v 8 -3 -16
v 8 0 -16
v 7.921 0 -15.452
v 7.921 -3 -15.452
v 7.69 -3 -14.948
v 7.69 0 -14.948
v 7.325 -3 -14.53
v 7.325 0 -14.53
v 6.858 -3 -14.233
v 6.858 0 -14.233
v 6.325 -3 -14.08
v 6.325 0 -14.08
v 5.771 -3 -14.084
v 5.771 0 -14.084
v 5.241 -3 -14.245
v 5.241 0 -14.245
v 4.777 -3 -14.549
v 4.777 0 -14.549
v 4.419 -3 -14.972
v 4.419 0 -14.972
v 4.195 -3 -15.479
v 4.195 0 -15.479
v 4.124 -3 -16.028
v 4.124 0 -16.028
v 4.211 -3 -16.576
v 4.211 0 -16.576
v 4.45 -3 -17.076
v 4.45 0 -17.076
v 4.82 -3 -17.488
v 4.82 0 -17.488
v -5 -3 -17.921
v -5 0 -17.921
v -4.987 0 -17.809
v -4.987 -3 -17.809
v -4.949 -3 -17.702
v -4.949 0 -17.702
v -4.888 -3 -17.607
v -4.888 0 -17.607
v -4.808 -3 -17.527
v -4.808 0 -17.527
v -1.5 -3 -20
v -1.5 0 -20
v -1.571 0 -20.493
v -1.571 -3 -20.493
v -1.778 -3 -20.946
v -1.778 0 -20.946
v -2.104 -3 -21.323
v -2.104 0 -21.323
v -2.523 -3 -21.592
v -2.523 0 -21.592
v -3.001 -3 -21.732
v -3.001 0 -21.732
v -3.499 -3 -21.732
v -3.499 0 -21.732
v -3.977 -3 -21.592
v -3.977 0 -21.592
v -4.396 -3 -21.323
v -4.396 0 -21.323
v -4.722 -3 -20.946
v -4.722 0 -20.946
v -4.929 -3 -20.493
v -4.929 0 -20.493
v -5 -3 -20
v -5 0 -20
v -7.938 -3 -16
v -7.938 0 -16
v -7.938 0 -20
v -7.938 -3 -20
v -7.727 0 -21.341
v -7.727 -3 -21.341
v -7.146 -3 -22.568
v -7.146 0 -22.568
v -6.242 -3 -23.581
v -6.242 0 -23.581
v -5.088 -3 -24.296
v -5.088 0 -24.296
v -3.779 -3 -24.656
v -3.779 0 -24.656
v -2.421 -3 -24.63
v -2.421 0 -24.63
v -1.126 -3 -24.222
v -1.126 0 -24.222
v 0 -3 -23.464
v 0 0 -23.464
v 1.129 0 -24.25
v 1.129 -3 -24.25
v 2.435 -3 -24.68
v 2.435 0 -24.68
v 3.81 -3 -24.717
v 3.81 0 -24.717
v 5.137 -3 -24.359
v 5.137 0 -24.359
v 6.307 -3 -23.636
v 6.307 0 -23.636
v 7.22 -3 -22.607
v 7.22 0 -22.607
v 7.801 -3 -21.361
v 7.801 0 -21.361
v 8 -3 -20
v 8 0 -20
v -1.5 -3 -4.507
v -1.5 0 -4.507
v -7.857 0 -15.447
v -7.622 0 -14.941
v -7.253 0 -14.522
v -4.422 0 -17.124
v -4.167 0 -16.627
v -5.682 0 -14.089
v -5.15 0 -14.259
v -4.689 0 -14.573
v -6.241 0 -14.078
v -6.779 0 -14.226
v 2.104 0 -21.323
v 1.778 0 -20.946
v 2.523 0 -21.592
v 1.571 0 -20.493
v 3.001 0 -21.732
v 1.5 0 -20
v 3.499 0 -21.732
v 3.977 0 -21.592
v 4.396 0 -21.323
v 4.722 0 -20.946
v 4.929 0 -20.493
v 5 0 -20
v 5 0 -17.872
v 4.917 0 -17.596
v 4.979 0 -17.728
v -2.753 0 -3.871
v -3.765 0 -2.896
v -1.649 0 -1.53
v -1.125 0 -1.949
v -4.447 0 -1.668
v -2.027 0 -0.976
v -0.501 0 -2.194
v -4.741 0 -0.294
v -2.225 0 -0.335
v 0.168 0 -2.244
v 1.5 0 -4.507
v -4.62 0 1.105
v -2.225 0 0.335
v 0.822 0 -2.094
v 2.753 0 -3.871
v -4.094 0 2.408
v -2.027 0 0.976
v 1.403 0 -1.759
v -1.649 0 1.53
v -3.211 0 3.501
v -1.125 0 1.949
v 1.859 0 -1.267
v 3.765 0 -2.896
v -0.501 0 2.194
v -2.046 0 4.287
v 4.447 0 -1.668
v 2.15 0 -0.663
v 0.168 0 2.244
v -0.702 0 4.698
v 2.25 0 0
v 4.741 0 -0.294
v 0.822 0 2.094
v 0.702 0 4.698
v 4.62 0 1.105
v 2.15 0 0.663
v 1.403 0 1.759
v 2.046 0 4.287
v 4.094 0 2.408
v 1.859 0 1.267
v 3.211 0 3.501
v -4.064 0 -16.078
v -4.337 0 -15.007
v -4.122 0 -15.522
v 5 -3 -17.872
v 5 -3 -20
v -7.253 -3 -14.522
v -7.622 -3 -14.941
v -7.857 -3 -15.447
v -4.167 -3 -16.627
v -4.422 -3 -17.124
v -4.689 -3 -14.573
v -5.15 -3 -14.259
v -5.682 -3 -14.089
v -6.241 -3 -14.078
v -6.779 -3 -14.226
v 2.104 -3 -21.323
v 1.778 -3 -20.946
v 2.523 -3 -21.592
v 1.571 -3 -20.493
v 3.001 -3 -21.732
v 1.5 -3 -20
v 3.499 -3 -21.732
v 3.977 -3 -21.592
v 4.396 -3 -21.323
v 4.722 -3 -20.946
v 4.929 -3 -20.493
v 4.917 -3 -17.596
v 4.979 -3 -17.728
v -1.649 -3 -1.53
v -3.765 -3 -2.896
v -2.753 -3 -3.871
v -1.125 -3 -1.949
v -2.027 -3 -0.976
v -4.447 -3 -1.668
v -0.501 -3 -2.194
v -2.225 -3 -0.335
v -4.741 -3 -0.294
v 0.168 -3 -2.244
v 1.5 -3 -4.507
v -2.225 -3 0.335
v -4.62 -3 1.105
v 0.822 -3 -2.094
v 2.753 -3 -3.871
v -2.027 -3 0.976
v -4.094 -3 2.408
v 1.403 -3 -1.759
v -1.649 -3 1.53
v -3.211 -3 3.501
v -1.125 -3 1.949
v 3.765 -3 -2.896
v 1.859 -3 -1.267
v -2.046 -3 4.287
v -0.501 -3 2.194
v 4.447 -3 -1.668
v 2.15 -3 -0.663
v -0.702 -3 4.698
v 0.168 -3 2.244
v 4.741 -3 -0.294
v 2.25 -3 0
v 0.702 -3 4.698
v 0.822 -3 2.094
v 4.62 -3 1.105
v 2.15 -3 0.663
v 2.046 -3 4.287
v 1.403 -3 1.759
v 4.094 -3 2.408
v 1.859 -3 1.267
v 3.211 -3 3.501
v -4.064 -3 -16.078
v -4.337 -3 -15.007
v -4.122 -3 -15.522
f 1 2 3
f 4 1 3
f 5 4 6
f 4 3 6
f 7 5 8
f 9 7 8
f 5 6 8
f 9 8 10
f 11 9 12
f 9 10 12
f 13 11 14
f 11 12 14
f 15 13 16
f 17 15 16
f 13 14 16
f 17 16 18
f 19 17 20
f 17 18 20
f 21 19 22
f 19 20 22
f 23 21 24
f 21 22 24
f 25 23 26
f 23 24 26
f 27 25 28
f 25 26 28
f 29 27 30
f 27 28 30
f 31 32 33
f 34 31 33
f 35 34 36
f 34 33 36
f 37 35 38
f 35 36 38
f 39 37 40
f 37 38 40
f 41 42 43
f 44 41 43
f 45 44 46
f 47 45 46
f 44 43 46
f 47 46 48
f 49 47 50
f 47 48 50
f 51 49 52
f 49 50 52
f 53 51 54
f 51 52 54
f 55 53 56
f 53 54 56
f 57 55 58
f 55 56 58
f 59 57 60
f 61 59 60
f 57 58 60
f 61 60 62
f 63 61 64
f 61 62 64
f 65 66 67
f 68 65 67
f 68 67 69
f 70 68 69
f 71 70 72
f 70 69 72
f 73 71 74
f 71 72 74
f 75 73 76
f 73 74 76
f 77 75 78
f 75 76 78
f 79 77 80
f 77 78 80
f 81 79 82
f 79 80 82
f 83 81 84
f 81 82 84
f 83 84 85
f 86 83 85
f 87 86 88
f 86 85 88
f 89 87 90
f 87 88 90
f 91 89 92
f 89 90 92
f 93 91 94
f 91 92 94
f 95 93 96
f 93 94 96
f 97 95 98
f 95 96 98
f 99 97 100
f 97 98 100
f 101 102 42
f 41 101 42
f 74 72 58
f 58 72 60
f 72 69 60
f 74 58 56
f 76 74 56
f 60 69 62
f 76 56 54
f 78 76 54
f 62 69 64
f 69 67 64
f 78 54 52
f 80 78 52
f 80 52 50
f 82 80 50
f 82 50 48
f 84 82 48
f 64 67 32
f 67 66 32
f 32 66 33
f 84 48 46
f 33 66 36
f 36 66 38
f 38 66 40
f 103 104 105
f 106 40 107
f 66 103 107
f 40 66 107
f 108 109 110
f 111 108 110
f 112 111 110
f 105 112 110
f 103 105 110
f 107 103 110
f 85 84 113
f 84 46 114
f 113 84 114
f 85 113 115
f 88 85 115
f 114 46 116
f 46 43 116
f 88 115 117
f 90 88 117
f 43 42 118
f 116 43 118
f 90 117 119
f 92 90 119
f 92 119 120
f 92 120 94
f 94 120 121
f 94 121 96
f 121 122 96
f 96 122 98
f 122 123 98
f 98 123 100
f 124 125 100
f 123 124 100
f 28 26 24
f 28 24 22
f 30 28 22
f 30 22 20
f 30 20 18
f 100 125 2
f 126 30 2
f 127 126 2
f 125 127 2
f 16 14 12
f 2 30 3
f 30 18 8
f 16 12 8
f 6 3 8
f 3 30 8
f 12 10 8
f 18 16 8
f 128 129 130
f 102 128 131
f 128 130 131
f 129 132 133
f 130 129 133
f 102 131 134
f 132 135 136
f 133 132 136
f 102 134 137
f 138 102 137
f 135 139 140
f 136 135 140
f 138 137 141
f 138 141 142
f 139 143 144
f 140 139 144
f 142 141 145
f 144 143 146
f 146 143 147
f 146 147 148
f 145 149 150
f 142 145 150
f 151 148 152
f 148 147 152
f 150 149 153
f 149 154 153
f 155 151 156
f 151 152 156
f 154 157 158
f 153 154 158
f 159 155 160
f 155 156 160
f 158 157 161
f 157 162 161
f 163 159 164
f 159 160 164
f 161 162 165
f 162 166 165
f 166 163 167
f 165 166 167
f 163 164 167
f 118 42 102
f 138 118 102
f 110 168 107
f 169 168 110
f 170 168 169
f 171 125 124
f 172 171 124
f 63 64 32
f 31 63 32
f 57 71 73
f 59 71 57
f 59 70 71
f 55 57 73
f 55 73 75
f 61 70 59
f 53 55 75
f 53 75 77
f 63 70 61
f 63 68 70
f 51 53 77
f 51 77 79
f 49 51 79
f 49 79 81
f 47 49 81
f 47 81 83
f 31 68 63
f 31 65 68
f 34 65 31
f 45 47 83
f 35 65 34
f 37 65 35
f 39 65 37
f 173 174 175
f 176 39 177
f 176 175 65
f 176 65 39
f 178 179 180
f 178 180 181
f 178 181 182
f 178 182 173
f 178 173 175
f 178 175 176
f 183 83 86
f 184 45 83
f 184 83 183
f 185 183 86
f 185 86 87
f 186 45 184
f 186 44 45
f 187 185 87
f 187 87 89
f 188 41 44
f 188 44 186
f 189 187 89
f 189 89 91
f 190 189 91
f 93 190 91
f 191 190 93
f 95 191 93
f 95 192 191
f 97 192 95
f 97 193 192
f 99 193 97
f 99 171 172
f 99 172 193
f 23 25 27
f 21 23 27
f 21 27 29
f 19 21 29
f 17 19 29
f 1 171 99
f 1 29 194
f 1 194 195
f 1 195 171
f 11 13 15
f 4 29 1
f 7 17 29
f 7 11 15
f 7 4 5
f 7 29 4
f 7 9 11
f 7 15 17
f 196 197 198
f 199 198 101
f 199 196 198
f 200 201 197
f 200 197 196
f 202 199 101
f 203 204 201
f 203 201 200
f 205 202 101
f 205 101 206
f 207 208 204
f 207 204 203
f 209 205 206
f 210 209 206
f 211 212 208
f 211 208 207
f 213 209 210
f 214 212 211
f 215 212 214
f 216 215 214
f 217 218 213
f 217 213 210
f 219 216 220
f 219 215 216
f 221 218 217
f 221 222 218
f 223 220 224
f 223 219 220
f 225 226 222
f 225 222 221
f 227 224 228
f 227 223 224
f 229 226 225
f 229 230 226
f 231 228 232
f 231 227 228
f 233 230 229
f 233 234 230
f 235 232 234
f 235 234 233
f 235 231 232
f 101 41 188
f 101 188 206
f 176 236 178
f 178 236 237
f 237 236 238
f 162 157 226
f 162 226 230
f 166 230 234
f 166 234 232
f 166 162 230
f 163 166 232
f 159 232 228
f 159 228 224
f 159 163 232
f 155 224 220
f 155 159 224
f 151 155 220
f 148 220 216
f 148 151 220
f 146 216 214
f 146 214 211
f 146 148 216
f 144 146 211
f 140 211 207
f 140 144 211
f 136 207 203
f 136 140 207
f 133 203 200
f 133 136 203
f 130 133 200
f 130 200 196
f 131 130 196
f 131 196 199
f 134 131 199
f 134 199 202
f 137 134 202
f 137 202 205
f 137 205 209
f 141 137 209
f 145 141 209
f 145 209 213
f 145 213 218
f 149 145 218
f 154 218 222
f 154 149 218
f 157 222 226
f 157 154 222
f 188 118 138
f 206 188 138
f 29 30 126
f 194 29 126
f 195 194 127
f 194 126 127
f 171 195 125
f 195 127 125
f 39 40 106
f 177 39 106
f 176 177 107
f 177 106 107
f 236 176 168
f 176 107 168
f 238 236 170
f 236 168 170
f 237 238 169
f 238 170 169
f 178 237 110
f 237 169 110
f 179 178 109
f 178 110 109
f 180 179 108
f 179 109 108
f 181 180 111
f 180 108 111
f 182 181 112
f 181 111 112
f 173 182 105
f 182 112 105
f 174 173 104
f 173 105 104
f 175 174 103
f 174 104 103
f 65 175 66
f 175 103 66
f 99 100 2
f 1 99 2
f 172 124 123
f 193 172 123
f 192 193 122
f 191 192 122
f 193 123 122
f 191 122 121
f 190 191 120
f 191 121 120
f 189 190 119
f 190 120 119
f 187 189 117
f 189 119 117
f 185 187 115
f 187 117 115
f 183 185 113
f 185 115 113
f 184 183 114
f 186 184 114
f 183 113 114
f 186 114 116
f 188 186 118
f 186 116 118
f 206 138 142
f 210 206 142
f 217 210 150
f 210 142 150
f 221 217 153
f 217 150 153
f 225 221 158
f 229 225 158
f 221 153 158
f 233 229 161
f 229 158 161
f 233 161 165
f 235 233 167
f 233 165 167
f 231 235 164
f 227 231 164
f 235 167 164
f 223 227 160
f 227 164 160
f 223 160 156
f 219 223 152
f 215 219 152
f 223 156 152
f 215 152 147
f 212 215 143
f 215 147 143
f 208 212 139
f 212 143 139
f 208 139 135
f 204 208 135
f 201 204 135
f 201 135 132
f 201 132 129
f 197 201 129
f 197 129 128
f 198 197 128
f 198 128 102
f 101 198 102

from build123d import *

# Parameters (mm, degrees)
F1_R     = 2.25
F0_DEPTH = 3


with BuildPart() as f0:
    # F1 (on Front) → F0 (new body)
    with BuildSketch(Plane.XZ):
        with BuildLine():
            Line((1.5, -20), (1.5, -4.506939))
            ThreePointArc((1.5, -4.506939), (0, 4.75), (-1.5, -4.506939))
            Line((-1.5, -4.506939), (-1.5, -20))
            ThreePointArc((-1.5, -20), (-3.25, -21.75), (-5, -20))
            Line((-5, -20), (-5, -17.921303))
            ThreePointArc((-5, -17.921303), (-4.949359, -17.702039), (-4.807692, -17.52719))
            ThreePointArc((-4.807692, -17.52719), (-5.15035, -14.258736), (-7.9375, -16))
            Line((-7.9375, -16), (-7.9375, -20))
            ThreePointArc((-7.9375, -20), (-5.087796, -24.296187), (0, -23.464102))
            ThreePointArc((0, -23.464102), (5.137459, -24.358899), (8, -20))
            Line((8, -20), (8, -16))
            ThreePointArc((8, -16), (5.240564, -14.244698), (4.820345, -17.487997))
            ThreePointArc((4.820345, -17.487997), (4.952864, -17.659969), (5, -17.871897))
            Line((5, -17.871897), (5, -20))
            ThreePointArc((5, -20), (3.25, -21.75), (1.5, -20))
        make_face()
        Circle(F1_R, mode=Mode.SUBTRACT)
    extrude(amount=F0_DEPTH)


solid = f0.part
